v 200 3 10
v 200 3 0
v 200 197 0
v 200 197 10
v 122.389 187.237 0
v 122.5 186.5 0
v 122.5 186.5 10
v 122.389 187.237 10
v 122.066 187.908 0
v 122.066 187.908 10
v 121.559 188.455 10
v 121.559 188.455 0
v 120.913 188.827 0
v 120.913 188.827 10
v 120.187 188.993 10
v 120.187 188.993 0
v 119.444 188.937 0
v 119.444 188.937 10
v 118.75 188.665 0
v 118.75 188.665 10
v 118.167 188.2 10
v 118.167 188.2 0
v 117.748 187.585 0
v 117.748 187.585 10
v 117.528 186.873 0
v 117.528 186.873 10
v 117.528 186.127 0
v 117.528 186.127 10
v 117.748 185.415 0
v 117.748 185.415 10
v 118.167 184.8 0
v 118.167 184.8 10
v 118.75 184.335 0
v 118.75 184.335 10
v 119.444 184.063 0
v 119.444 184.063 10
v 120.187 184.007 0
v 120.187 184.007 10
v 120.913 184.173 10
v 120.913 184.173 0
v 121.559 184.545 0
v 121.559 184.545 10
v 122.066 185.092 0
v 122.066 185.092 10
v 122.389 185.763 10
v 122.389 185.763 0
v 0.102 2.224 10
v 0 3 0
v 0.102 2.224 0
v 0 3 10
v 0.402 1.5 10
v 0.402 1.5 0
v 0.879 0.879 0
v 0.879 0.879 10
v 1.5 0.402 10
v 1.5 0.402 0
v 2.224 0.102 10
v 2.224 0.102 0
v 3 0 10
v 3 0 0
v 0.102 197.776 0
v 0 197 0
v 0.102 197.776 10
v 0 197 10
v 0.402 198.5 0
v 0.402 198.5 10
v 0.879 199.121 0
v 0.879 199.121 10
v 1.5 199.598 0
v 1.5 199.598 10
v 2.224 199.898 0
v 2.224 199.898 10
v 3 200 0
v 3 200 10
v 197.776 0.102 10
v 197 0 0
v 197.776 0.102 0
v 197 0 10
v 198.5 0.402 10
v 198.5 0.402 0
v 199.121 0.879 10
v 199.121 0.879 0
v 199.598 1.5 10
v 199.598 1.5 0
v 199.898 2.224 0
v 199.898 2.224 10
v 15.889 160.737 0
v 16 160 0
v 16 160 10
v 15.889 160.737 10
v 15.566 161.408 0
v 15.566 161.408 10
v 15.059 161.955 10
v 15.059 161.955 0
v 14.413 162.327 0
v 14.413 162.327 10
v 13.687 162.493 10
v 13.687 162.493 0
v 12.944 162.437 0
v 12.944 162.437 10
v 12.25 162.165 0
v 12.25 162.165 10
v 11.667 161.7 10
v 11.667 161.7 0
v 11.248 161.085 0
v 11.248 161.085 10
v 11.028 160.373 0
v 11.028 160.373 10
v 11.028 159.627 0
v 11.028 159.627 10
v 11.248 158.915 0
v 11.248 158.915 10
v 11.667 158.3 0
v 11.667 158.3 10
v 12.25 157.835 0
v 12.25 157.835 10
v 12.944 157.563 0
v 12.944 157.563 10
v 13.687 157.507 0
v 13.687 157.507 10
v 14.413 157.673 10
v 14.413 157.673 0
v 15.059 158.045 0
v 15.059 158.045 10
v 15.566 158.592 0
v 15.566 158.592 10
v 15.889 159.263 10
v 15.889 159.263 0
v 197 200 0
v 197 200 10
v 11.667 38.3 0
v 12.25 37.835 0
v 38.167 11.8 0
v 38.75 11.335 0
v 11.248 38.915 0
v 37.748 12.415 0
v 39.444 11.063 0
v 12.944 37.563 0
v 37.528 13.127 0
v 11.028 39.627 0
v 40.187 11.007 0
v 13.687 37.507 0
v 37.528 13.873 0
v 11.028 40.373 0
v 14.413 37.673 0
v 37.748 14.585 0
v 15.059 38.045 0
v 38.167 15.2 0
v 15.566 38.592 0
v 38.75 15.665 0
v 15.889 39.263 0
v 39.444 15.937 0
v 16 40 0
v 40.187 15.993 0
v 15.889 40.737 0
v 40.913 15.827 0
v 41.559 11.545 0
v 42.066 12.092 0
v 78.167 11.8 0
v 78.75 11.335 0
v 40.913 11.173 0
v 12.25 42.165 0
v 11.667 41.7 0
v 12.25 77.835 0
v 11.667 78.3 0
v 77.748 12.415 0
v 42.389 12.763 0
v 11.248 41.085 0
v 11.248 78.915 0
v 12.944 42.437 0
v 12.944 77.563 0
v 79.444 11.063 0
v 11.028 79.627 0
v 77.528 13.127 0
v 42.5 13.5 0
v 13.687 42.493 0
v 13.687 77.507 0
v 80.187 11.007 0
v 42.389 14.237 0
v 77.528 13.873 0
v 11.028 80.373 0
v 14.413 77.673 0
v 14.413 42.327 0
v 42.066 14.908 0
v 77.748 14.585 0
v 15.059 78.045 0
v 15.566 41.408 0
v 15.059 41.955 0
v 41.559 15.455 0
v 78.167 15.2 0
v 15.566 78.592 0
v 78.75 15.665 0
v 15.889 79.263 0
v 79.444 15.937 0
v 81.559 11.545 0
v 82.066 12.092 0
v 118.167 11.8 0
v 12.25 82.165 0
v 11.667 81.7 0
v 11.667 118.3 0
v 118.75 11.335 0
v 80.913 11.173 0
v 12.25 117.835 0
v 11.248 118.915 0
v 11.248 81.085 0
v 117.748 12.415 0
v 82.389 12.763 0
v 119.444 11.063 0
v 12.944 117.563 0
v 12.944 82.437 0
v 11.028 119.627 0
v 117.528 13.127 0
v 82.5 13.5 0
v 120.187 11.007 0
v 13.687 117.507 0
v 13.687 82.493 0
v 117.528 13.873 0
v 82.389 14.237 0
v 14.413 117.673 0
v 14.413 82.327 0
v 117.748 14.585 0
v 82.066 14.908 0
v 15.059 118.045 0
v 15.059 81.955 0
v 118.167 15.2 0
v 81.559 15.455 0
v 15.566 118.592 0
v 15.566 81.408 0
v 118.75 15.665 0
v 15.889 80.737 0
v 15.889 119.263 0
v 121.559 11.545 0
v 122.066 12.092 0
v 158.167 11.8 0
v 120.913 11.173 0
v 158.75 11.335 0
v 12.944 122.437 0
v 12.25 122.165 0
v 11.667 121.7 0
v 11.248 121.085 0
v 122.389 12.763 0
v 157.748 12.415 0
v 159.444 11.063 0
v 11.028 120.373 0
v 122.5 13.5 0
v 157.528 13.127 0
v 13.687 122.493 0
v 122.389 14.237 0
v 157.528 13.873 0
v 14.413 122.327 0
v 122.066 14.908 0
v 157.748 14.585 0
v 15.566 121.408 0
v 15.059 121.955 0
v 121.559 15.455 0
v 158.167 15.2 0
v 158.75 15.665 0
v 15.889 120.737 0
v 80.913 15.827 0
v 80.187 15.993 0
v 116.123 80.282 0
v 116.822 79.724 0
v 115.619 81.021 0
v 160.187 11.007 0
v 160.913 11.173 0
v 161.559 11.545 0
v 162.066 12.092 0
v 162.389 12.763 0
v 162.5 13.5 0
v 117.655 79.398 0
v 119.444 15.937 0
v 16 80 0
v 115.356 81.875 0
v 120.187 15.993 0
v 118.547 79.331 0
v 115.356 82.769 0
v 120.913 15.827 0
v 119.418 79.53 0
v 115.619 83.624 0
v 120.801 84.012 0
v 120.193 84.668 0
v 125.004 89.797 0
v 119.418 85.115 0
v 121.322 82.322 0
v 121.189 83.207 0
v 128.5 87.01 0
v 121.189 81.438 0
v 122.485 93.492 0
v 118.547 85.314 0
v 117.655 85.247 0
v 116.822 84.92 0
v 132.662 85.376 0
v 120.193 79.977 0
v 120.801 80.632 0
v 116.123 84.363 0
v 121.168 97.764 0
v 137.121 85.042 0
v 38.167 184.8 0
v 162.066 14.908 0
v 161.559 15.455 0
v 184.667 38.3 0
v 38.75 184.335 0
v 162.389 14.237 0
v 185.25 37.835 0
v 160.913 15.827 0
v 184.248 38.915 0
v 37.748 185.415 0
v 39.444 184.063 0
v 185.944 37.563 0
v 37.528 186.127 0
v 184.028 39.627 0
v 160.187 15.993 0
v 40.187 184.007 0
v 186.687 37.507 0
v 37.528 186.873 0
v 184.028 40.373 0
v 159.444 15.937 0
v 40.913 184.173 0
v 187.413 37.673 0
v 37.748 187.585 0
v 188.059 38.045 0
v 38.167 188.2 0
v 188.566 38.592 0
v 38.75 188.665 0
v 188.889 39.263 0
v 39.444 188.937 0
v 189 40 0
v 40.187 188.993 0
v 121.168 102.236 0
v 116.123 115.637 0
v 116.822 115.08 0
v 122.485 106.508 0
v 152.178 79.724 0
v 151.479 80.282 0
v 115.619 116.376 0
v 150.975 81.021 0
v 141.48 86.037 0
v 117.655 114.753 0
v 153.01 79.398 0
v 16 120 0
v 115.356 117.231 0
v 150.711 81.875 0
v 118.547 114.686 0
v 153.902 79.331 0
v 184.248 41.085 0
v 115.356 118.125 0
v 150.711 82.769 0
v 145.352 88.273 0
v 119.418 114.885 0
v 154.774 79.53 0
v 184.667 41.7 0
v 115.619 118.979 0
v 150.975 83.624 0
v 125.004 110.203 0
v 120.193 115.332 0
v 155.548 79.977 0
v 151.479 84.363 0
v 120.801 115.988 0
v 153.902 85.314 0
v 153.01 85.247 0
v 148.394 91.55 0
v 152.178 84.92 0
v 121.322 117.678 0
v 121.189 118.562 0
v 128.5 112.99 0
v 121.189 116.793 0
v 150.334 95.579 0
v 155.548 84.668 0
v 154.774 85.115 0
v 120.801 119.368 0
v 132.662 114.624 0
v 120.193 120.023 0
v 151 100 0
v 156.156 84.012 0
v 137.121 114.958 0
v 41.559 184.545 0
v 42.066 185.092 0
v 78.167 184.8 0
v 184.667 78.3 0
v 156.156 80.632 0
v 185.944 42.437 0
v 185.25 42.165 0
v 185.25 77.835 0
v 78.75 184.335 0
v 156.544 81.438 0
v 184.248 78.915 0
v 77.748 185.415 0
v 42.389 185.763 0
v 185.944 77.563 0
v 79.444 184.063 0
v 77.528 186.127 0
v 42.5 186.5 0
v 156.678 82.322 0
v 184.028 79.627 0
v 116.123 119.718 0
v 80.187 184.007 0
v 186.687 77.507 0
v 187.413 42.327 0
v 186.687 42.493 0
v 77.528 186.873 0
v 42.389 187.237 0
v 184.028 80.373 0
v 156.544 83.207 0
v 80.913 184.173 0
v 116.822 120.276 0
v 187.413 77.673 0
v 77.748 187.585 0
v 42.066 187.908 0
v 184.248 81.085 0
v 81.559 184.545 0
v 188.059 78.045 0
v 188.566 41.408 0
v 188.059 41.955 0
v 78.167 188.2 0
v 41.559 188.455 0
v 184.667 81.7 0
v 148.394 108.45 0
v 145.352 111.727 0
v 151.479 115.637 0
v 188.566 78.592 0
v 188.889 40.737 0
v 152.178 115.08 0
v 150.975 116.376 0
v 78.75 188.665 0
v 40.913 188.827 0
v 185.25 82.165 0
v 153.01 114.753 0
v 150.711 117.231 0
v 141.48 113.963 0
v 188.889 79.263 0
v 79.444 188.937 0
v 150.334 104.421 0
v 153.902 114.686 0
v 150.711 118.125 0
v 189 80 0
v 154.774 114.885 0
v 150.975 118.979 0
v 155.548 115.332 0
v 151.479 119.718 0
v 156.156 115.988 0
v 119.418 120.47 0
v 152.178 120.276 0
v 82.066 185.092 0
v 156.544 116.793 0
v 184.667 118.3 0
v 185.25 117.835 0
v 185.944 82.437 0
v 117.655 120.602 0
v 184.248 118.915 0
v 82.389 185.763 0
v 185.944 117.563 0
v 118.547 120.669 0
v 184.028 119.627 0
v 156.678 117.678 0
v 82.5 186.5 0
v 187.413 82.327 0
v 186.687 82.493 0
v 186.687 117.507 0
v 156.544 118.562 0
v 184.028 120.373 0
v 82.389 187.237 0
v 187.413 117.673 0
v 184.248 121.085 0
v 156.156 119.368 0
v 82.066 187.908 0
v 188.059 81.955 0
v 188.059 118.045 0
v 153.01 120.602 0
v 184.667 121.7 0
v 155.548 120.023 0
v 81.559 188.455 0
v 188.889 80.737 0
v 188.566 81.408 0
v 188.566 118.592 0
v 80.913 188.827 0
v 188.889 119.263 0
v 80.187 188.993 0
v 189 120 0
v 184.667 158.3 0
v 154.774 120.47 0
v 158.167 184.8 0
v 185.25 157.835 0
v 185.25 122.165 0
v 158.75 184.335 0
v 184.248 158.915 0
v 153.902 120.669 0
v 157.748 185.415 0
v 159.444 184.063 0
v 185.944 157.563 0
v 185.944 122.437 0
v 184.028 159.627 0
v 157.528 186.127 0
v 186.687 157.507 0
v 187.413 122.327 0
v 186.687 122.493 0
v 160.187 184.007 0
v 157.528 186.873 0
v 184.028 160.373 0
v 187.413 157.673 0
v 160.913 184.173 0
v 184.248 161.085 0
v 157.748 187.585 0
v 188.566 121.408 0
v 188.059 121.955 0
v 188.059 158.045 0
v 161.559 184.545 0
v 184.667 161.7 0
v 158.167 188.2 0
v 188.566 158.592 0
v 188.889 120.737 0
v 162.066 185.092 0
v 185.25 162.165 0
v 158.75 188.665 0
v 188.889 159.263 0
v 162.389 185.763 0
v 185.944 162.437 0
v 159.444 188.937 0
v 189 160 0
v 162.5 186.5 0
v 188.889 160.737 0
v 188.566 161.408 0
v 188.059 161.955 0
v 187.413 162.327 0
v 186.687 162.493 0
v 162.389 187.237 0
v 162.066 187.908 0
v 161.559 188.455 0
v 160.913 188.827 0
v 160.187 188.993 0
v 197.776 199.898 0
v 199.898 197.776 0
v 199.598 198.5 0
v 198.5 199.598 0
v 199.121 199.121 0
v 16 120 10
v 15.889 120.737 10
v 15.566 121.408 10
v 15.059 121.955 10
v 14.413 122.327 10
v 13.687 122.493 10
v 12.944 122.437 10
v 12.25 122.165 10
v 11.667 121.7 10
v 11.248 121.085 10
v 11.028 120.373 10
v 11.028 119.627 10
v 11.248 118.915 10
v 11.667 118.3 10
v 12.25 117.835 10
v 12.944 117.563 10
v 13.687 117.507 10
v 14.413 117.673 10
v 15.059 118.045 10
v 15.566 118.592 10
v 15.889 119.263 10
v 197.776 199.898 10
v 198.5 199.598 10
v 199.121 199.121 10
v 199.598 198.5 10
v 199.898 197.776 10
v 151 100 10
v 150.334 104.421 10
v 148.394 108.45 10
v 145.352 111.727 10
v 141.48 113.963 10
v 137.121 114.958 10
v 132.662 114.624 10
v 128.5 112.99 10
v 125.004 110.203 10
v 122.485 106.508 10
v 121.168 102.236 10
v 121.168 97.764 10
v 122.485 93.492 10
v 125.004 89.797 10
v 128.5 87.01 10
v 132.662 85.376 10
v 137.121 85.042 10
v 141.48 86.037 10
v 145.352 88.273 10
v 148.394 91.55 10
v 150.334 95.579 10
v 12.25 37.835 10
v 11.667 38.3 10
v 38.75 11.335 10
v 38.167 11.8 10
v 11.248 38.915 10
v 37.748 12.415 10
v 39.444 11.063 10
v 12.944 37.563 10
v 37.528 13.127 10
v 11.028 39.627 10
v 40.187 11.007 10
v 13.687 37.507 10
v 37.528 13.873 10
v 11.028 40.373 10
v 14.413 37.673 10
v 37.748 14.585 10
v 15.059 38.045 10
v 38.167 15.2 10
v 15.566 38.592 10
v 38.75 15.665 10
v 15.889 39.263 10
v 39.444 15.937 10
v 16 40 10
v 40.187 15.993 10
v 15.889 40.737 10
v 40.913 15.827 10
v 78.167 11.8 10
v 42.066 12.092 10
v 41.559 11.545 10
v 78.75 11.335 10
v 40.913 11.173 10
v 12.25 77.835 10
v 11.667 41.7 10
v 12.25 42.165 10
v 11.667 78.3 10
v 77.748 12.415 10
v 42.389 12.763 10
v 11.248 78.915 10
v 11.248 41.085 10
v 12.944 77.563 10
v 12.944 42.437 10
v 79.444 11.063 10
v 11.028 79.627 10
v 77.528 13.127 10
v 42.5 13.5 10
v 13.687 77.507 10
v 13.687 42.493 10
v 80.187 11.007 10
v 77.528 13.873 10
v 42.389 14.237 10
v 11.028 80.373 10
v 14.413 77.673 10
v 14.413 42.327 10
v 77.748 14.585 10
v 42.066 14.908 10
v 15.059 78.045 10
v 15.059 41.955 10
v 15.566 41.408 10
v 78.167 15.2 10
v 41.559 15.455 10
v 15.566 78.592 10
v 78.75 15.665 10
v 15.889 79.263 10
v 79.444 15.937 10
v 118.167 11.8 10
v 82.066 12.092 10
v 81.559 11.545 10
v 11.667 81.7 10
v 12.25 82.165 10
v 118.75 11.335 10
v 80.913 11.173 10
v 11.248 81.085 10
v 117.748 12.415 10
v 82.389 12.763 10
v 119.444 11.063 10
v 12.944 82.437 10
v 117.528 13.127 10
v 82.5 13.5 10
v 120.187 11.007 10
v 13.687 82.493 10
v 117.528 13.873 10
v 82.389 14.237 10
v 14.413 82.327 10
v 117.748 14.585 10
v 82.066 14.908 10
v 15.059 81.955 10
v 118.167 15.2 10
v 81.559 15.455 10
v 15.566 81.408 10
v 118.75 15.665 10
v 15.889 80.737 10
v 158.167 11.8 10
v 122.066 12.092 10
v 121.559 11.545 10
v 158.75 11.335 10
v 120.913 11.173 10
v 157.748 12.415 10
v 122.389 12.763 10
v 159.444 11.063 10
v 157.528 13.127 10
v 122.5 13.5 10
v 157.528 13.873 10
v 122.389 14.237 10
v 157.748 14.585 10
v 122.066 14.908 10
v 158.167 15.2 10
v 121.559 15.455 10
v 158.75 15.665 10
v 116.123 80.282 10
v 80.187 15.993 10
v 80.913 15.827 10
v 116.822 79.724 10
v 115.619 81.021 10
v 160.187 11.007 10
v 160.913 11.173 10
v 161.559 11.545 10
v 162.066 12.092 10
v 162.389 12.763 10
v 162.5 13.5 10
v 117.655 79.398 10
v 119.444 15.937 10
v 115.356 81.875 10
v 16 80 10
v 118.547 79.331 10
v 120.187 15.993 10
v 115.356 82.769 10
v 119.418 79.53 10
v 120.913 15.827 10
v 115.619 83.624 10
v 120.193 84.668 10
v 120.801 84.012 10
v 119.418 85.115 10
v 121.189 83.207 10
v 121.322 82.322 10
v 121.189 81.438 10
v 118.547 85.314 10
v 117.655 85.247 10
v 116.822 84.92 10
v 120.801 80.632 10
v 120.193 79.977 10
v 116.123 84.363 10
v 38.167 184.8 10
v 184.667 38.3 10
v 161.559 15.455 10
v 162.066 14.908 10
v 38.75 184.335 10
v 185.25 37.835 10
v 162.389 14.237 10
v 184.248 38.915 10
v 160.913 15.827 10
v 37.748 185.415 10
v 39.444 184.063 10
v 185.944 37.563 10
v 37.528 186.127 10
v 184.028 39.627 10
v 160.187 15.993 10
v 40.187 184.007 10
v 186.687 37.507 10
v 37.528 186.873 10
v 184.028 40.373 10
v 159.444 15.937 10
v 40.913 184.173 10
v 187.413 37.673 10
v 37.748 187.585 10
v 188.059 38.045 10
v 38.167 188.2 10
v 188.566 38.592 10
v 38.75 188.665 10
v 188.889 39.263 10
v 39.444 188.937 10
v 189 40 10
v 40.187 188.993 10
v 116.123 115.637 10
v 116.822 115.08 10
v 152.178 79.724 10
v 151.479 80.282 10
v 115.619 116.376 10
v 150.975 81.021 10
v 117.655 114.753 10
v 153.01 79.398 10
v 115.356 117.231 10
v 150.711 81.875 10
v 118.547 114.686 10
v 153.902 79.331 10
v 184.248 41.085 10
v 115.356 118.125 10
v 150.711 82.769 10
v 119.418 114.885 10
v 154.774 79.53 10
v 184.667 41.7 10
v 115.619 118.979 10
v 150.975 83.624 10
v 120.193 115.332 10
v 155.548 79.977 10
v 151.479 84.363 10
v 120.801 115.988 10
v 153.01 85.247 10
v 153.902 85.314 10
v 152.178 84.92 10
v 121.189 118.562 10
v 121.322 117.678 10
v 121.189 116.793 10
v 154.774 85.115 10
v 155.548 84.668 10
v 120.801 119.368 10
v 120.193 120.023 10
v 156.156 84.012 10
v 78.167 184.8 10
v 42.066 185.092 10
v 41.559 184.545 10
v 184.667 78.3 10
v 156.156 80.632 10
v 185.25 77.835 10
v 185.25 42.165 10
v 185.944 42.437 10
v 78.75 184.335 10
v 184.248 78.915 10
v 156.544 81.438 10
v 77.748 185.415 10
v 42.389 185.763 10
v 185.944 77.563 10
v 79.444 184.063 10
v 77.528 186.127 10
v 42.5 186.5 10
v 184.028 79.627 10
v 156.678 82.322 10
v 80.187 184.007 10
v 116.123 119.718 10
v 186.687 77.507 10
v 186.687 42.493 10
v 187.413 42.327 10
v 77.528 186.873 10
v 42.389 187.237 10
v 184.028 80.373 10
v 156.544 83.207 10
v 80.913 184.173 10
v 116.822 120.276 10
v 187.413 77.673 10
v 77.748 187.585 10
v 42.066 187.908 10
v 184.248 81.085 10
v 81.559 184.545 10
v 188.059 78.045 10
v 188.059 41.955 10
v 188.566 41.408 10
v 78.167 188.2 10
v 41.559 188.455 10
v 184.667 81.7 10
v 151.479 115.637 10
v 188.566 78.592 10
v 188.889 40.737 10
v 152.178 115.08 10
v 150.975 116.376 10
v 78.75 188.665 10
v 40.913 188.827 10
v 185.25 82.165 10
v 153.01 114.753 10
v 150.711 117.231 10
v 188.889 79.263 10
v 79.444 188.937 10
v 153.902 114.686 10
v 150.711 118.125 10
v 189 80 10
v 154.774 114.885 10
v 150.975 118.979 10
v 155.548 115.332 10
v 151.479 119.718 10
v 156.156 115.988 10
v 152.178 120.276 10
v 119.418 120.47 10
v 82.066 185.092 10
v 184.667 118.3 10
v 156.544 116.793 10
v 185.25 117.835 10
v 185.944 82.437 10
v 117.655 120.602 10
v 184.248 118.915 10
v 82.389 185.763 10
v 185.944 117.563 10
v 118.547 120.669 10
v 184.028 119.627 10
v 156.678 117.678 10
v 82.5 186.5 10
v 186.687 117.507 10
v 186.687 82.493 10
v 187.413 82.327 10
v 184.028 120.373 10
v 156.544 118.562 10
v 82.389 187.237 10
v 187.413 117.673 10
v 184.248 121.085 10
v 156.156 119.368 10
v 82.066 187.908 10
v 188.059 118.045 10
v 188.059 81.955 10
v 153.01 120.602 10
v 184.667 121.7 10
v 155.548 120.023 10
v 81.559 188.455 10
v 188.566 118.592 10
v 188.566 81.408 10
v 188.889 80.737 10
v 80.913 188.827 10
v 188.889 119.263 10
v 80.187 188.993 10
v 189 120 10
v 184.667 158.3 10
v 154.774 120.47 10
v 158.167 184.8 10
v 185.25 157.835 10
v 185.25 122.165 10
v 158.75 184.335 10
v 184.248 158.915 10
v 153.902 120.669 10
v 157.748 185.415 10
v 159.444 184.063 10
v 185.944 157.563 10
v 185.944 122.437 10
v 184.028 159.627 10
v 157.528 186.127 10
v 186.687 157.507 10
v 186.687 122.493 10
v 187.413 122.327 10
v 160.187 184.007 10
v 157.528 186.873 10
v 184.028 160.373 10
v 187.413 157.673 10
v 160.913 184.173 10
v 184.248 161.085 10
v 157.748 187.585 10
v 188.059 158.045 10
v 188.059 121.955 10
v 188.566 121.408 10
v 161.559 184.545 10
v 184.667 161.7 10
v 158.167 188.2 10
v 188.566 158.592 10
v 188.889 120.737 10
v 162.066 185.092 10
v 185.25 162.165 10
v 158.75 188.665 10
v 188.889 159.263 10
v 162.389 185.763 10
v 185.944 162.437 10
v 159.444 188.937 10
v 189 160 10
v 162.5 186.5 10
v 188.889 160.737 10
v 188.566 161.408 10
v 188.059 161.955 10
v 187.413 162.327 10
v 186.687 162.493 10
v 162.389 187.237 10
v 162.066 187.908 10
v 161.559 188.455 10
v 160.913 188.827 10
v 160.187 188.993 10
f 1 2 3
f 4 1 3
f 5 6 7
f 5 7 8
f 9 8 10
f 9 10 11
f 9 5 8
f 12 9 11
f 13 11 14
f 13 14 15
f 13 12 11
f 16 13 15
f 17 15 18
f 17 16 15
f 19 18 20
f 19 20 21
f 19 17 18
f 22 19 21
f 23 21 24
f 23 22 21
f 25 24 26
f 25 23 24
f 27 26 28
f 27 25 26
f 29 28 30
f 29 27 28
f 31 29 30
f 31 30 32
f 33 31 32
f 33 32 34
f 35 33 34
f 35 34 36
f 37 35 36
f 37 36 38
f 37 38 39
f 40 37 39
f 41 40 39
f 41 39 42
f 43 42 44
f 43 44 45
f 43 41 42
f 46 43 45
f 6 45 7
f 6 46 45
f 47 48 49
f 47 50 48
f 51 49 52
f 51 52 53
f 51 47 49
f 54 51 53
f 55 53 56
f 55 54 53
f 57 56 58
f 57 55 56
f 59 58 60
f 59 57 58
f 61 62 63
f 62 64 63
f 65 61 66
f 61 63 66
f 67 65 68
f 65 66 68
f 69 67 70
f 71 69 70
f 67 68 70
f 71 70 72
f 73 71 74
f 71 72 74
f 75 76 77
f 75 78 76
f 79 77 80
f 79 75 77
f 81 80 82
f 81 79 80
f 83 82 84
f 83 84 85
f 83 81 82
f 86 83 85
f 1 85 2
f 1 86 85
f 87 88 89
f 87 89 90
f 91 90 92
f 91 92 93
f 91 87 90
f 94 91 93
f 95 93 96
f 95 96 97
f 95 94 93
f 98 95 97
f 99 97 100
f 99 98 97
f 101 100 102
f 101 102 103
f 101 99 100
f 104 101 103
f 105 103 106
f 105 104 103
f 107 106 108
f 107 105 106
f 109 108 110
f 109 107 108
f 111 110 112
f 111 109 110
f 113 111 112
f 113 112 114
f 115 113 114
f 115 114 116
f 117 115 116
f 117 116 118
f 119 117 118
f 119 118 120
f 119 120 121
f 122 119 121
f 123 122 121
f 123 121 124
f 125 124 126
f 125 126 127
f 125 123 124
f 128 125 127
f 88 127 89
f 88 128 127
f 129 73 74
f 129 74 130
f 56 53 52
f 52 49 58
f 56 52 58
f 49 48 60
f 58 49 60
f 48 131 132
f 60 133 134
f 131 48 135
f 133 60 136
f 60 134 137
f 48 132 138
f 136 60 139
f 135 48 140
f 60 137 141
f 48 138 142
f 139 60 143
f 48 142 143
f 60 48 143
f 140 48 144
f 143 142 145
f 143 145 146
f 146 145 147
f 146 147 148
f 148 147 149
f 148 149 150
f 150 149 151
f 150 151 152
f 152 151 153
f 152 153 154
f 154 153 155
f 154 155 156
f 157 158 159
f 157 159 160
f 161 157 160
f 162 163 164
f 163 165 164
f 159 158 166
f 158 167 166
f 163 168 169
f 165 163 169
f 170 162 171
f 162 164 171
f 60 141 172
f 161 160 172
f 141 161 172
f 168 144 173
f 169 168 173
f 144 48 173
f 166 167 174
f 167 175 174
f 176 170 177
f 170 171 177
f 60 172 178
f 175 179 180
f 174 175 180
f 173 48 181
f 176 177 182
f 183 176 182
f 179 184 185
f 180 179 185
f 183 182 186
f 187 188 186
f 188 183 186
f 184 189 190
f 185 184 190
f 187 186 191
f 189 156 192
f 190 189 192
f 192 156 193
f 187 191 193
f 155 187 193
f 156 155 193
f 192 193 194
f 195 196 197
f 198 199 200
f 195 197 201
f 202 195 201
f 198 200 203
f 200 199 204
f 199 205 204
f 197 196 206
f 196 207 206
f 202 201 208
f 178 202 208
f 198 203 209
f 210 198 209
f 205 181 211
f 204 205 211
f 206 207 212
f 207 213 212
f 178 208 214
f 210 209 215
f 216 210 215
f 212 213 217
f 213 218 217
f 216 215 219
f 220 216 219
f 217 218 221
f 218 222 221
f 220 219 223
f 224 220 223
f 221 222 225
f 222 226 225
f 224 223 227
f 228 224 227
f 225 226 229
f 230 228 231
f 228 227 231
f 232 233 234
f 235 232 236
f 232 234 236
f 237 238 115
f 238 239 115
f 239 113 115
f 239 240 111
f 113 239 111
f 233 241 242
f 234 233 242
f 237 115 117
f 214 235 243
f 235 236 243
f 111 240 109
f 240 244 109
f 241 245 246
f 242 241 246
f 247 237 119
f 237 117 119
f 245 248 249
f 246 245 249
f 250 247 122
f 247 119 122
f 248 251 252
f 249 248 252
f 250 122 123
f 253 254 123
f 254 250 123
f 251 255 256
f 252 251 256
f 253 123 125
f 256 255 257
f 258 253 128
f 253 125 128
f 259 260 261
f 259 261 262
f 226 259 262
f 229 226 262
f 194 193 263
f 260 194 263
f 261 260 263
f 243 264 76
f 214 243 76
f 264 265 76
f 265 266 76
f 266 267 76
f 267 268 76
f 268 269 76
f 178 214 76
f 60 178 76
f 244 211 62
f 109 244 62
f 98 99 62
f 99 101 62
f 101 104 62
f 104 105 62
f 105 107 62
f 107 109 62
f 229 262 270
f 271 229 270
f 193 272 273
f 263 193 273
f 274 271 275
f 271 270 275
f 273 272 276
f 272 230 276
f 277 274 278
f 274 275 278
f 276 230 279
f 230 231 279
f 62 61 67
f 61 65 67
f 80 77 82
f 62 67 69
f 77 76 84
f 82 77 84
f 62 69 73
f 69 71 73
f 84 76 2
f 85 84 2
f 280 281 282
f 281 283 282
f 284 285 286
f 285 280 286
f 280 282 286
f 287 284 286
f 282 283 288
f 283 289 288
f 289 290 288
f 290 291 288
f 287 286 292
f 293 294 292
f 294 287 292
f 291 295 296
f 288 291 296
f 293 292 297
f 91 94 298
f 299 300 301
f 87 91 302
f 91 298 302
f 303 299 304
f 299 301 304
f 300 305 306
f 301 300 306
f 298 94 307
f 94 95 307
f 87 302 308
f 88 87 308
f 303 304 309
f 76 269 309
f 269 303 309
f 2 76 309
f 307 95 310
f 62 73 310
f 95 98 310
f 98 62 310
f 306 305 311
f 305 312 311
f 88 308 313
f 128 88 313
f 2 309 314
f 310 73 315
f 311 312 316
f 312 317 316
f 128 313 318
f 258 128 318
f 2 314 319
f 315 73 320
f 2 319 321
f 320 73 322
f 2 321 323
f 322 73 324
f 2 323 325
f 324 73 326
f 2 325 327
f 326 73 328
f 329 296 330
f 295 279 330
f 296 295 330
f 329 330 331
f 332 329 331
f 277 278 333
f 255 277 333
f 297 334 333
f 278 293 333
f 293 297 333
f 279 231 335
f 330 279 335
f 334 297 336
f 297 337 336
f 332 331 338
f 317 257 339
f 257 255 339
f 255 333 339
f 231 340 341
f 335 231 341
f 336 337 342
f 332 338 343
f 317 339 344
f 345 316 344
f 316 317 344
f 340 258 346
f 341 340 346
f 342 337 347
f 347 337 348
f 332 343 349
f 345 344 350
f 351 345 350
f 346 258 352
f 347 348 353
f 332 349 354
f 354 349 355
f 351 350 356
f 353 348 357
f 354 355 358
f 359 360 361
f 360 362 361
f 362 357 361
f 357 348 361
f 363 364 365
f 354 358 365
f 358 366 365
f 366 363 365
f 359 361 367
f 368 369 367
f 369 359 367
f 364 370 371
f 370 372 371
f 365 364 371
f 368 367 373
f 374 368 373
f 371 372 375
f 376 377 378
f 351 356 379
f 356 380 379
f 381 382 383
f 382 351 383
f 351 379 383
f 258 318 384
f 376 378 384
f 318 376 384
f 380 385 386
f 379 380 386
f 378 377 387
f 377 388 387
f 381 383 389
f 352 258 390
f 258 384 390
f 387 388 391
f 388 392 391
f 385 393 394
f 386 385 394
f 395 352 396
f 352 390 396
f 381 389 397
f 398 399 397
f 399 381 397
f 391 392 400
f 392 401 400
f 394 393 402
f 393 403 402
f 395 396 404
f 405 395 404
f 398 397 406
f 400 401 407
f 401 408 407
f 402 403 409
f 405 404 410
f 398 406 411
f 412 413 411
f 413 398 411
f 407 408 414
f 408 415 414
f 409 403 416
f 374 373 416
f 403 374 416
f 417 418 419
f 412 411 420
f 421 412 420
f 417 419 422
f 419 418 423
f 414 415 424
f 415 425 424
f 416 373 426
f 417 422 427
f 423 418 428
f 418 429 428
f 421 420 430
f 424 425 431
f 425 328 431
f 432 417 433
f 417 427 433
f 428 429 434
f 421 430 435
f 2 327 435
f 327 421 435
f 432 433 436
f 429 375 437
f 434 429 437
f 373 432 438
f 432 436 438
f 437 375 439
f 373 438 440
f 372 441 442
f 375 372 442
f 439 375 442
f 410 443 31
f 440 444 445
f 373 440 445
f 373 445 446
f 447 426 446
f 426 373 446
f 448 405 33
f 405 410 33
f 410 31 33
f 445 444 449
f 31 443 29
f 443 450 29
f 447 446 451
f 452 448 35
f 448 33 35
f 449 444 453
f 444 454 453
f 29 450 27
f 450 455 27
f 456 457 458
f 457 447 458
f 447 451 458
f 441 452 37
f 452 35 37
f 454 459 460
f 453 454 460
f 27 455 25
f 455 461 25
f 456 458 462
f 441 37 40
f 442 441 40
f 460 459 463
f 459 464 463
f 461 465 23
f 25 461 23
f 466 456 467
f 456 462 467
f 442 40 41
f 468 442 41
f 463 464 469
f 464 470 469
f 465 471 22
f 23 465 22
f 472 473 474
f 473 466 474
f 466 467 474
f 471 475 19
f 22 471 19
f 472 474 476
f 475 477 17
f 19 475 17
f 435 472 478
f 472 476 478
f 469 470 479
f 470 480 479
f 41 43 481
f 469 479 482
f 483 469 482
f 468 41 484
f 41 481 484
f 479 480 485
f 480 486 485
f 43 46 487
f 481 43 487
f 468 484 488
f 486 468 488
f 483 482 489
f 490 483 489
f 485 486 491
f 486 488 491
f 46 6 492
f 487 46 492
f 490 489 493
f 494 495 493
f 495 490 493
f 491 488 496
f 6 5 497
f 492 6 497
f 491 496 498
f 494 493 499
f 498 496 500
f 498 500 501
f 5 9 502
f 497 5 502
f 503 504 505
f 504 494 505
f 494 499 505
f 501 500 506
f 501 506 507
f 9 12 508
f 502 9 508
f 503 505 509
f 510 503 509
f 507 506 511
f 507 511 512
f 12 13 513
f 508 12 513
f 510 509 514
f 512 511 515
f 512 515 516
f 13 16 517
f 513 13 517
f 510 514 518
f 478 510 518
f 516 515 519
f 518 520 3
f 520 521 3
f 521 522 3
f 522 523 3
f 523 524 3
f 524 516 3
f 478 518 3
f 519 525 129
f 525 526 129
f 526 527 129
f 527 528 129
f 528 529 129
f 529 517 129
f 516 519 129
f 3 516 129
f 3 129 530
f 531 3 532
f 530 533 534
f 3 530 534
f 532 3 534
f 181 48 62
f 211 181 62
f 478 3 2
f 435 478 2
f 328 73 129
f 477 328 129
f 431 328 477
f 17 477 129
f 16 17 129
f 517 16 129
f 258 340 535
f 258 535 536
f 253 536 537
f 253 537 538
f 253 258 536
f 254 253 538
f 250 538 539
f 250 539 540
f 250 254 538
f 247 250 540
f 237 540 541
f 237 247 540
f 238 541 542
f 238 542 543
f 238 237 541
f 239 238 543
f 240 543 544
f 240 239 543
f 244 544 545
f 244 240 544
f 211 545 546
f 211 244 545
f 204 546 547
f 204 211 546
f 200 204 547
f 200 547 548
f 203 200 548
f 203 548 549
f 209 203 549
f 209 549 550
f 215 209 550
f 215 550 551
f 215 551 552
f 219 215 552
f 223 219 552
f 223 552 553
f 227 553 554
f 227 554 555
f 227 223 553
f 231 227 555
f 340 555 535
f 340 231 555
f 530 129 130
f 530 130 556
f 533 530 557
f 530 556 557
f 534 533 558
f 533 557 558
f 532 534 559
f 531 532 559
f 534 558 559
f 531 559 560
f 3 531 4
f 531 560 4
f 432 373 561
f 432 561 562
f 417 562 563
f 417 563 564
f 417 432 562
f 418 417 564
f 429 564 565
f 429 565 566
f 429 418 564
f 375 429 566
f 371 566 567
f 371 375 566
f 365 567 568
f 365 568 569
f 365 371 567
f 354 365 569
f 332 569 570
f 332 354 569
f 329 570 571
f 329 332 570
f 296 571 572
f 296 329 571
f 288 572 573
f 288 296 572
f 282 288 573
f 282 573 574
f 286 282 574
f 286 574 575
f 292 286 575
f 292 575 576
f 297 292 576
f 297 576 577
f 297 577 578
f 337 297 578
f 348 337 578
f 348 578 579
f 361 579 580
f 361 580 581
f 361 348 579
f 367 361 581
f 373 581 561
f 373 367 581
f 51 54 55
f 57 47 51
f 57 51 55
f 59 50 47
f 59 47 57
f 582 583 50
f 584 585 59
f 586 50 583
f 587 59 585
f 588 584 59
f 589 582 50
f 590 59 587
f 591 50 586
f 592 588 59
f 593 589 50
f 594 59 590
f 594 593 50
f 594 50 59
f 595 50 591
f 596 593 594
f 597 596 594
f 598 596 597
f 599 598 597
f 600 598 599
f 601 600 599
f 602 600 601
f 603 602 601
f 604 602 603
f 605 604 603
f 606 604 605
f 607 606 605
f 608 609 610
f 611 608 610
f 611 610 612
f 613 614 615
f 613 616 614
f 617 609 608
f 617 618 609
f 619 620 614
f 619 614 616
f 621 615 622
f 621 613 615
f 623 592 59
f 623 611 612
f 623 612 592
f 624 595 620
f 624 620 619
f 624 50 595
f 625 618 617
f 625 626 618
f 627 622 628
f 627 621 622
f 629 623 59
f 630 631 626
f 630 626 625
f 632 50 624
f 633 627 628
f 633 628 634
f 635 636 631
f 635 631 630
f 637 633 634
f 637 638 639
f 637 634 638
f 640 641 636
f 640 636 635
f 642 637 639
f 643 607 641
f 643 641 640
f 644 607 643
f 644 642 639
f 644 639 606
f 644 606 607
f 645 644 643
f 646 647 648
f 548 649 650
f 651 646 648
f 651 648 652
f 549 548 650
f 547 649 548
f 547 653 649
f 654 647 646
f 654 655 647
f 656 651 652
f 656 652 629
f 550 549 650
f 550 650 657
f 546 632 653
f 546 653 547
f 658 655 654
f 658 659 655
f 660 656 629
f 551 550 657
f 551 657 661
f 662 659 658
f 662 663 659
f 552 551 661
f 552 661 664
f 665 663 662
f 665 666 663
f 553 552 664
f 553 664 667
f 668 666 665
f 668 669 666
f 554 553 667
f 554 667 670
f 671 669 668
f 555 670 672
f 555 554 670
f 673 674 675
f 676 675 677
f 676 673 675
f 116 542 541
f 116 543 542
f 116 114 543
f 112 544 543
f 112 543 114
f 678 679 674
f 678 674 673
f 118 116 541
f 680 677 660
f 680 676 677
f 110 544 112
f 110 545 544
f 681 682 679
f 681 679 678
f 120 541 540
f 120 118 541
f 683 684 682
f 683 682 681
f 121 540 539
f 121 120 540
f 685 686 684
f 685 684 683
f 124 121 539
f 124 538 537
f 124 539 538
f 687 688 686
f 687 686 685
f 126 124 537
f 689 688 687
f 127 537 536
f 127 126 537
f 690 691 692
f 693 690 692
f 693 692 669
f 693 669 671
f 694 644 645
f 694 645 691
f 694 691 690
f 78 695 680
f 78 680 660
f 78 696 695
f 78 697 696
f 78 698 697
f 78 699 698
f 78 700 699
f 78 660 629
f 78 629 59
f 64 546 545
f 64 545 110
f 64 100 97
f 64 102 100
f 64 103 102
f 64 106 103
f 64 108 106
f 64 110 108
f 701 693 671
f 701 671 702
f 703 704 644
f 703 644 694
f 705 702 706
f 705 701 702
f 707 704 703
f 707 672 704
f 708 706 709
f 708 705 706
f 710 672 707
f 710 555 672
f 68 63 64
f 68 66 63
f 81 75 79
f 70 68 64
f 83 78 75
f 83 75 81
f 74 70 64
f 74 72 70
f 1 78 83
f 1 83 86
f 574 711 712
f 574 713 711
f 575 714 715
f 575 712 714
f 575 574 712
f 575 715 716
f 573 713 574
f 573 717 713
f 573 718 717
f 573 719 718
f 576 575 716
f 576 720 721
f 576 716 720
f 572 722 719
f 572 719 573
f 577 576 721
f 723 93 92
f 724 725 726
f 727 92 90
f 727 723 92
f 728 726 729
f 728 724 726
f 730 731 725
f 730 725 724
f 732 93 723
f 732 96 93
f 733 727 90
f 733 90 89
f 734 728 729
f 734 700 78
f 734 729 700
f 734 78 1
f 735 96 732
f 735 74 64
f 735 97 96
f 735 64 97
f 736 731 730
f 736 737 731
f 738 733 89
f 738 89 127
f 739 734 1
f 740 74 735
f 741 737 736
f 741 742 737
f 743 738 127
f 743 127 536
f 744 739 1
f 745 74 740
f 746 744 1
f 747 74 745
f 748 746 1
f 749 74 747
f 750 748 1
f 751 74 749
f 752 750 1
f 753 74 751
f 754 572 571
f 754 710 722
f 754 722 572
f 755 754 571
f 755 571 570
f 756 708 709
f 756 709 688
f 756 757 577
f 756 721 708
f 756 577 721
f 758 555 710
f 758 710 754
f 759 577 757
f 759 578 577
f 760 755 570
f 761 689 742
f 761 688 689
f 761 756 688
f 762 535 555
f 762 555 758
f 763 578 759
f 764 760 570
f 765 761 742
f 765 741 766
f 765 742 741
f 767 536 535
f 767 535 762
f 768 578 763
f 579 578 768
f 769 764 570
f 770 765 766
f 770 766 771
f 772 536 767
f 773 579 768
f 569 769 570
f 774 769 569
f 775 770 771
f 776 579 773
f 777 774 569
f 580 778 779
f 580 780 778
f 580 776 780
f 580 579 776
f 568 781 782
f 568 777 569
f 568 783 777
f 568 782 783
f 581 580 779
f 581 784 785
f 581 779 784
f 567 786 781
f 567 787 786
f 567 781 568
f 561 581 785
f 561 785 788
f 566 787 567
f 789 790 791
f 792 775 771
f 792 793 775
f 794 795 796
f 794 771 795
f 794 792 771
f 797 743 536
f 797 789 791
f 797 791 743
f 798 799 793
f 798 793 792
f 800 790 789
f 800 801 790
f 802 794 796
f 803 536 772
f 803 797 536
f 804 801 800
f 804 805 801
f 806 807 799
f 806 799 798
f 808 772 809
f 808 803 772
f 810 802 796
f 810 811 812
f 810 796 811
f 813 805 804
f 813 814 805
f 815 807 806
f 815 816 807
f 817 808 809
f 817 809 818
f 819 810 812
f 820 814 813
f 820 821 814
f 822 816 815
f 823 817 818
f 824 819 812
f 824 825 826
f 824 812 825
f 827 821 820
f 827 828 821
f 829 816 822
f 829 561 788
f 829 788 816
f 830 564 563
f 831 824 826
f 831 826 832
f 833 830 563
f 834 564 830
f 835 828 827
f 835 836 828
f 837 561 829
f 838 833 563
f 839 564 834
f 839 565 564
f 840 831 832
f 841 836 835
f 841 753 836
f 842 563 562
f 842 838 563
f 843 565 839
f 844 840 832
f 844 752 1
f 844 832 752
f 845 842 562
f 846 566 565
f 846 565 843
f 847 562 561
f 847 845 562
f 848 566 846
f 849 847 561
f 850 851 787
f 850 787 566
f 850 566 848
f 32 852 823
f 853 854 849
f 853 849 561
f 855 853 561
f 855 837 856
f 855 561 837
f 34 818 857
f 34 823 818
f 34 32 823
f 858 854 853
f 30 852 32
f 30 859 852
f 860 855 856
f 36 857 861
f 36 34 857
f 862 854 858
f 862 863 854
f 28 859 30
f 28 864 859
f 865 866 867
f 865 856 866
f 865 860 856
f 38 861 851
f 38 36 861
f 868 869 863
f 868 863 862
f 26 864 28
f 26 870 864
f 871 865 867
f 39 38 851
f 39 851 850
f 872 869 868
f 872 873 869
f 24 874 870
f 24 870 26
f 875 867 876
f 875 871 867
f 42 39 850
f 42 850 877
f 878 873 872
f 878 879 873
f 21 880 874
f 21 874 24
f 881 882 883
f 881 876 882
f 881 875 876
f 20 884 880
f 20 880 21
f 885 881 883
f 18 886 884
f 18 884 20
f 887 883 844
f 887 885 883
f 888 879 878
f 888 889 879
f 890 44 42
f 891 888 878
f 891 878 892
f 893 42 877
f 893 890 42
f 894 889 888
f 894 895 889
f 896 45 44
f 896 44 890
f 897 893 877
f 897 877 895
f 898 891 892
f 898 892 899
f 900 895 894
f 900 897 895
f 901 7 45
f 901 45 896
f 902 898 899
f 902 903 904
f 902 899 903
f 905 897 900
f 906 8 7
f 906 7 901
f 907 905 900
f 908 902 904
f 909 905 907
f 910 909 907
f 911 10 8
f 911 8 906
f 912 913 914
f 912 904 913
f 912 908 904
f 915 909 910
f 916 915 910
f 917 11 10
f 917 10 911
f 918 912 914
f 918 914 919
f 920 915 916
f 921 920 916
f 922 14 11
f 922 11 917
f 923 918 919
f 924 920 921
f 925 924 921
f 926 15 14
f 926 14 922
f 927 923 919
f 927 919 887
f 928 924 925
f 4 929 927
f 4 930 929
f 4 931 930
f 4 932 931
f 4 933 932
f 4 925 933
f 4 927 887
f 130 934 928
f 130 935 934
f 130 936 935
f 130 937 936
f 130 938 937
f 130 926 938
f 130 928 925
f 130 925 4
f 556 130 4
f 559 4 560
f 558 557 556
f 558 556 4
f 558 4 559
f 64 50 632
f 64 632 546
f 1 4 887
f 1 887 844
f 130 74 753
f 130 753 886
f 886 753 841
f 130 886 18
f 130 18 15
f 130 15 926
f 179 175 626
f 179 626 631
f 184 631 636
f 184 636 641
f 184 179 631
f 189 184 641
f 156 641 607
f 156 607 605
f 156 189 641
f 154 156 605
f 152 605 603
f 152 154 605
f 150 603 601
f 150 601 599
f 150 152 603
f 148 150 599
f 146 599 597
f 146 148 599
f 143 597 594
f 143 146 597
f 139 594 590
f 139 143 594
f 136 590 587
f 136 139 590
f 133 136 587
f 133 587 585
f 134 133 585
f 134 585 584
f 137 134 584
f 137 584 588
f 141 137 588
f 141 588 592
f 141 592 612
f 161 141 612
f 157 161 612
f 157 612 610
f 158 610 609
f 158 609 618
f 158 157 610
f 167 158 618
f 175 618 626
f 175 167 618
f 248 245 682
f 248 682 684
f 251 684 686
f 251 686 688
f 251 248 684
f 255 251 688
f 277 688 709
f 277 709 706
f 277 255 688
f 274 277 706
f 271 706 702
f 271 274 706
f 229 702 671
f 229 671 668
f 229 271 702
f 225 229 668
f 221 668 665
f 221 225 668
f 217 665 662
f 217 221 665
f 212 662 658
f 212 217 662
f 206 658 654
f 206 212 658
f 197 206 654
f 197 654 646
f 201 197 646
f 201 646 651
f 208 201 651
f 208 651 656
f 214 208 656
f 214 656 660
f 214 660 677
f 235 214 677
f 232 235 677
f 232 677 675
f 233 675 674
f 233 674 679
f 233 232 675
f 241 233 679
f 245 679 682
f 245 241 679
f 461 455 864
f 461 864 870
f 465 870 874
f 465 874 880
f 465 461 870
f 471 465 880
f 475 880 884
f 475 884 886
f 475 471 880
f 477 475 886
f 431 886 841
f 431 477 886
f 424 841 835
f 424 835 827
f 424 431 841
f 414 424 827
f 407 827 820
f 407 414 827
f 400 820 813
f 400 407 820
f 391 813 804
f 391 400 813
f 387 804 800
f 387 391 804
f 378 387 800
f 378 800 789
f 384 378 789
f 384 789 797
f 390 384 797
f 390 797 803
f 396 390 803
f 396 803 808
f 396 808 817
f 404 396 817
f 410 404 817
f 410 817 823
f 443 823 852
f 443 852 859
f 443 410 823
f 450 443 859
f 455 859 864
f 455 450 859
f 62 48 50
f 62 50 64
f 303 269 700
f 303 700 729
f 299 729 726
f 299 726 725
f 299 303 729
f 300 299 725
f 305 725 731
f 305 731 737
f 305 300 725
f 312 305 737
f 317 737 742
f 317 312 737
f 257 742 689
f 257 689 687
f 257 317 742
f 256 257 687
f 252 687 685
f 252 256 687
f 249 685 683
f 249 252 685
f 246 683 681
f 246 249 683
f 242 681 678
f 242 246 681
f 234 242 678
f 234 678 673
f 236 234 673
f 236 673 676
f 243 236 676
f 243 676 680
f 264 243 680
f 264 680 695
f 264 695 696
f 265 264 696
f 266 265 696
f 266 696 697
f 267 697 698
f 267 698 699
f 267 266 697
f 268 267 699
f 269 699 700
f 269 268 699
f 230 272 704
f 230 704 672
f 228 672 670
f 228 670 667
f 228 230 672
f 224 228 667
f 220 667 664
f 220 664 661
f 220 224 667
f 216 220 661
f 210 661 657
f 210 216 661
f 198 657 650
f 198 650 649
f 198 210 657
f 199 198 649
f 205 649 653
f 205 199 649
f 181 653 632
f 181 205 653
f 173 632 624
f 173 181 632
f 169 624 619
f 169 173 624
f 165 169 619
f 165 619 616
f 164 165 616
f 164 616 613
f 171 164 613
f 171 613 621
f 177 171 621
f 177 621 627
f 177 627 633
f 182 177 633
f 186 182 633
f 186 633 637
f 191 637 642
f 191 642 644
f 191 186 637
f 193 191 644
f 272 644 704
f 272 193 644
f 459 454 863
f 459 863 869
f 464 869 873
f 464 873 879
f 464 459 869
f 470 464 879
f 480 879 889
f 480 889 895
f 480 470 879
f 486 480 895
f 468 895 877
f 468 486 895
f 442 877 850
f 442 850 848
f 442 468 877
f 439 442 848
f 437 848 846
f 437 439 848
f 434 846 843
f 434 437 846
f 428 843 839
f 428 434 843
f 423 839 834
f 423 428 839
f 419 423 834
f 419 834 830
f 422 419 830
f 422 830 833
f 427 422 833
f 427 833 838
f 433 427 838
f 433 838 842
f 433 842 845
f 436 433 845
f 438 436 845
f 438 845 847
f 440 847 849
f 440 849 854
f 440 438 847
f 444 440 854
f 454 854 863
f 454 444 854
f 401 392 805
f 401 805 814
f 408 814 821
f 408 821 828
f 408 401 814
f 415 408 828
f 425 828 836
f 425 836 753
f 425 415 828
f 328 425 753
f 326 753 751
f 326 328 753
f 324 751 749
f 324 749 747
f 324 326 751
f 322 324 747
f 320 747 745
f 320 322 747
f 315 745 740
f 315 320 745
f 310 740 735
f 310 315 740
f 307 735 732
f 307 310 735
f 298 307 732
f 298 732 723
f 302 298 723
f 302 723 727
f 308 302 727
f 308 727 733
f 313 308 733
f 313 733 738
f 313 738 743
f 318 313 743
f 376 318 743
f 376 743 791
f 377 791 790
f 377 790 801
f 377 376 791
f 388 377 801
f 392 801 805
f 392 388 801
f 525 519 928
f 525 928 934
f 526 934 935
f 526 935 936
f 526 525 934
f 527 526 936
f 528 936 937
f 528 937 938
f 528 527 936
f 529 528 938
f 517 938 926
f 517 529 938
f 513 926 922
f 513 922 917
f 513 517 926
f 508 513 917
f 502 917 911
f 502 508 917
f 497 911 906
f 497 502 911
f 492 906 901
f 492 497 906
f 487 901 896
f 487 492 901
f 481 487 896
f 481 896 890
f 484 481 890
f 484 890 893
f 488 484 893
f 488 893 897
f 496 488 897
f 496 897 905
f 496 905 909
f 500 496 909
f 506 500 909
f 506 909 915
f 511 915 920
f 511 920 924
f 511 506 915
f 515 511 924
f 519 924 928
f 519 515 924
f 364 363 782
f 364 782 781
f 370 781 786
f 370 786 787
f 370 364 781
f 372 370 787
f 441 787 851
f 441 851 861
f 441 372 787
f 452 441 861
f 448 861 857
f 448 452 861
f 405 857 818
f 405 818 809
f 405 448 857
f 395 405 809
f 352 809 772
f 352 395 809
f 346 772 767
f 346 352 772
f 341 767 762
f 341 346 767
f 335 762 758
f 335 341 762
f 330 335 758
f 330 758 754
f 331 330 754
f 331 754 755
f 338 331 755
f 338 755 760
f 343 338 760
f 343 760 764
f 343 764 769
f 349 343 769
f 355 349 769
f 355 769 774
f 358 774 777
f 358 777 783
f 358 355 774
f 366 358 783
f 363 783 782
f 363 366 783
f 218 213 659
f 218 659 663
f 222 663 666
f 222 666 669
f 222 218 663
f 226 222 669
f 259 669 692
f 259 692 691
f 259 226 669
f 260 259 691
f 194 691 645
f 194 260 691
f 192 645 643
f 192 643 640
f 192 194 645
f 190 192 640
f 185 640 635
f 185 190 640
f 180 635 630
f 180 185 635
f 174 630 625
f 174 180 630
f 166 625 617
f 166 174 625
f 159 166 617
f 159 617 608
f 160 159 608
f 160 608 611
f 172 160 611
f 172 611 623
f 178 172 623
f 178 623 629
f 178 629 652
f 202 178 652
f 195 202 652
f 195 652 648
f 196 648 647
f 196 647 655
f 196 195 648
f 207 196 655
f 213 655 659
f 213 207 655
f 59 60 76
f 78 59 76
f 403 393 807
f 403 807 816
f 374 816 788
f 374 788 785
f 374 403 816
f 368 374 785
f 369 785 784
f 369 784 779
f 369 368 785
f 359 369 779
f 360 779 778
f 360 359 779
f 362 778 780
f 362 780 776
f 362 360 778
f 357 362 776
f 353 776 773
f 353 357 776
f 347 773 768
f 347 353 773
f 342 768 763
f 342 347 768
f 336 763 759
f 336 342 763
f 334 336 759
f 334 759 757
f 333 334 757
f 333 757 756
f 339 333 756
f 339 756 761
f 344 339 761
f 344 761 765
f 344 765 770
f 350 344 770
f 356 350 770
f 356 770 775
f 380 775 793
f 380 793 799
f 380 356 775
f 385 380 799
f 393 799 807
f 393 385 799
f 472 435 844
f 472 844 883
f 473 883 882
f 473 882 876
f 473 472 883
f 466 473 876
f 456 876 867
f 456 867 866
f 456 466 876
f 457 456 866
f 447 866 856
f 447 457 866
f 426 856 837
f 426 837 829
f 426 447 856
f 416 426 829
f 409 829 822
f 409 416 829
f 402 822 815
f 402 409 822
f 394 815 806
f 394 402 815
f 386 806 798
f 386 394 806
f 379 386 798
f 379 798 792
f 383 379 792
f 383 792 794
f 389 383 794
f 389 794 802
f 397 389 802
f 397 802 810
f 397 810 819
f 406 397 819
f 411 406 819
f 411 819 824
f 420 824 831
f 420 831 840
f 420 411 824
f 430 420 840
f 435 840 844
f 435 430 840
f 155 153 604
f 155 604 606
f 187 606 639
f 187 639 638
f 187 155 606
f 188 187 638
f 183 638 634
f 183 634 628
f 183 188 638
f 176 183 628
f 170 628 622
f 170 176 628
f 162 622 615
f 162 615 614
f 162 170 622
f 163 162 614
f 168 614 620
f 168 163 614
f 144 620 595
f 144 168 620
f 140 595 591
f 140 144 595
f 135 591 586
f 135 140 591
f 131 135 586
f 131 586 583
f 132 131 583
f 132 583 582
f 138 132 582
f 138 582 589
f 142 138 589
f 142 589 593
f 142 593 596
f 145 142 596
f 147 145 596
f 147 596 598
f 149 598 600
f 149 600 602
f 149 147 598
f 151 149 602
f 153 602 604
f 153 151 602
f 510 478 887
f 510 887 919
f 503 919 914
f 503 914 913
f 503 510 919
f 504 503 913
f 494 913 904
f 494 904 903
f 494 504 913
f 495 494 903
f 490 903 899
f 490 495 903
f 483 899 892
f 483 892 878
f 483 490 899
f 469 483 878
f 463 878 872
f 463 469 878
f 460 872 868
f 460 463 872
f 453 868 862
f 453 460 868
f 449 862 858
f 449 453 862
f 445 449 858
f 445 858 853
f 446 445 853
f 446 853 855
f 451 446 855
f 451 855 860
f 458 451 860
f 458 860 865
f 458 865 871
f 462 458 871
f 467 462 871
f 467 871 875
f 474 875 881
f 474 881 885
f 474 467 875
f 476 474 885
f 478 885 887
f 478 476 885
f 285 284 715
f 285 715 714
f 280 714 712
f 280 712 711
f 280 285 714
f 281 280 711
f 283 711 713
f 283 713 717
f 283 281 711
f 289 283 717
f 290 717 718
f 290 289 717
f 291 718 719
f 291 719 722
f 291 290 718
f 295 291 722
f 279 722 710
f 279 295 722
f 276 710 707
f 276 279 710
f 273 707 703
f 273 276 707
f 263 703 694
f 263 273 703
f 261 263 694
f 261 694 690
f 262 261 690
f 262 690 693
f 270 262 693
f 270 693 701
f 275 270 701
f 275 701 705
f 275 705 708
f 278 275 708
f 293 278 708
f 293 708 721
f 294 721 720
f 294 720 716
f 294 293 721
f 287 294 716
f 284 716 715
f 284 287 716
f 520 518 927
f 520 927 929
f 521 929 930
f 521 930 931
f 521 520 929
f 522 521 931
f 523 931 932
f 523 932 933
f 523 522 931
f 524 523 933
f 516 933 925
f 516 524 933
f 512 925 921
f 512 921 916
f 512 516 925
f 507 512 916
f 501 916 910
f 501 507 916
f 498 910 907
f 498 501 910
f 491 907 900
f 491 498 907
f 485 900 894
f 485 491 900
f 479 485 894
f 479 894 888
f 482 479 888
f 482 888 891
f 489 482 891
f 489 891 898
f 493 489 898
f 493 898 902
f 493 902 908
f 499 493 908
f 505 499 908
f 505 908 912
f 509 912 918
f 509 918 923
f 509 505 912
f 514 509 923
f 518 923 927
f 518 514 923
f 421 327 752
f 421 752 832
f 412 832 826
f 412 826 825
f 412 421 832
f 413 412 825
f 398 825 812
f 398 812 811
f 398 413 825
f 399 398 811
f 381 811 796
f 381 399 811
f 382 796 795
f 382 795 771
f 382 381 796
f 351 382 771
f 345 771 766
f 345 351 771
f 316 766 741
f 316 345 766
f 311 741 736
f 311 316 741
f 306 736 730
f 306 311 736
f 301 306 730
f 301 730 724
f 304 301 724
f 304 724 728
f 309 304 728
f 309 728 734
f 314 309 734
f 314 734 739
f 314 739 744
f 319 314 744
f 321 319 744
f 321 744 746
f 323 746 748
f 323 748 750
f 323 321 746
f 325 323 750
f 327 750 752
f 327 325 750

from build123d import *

# Parameters (mm, degrees)
SKETCH_W   = 200
SKETCH_H   = 200
SKETCH_R   = 15
SKETCH_R_2 = 3
SKETCH_R_3 = 2.5
PAD_DEPTH  = 10
FILLET_R   = 3


with BuildPart() as part:
    # Sketch → Pad (new body)
    with BuildSketch(Plane.XY):
        with Locations((100, 100)):
            Rectangle(SKETCH_W, SKETCH_H)
        with Locations((136, 100)):
            Circle(SKETCH_R, mode=Mode.SUBTRACT)
        with Locations((118.32233, 117.67767)):
            Circle(SKETCH_R_2, mode=Mode.SUBTRACT)
        with Locations((153.67767, 117.67767)):
            Circle(SKETCH_R_2, mode=Mode.SUBTRACT)
        with Locations((118.32233, 82.32233)):
            Circle(SKETCH_R_2, mode=Mode.SUBTRACT)
        with Locations((153.67767, 82.32233)):
            Circle(SKETCH_R_2, mode=Mode.SUBTRACT)
        with Locations((40, 13.5)):
            Circle(SKETCH_R_3, mode=Mode.SUBTRACT)
        with Locations((160, 13.5)):
            Circle(SKETCH_R_3, mode=Mode.SUBTRACT)
        with Locations((80, 13.5)):
            Circle(SKETCH_R_3, mode=Mode.SUBTRACT)
        with Locations((120, 13.5)):
            Circle(SKETCH_R_3, mode=Mode.SUBTRACT)
        with Locations((40, 186.5)):
            Circle(SKETCH_R_3, mode=Mode.SUBTRACT)
        with Locations((80, 186.5)):
            Circle(SKETCH_R_3, mode=Mode.SUBTRACT)
        with Locations((120, 186.5)):
            Circle(SKETCH_R_3, mode=Mode.SUBTRACT)
        with Locations((160, 186.5)):
            Circle(SKETCH_R_3, mode=Mode.SUBTRACT)
        with Locations((13.5, 160)):
            Circle(SKETCH_R_3, mode=Mode.SUBTRACT)
        with Locations((13.5, 120)):
            Circle(SKETCH_R_3, mode=Mode.SUBTRACT)
        with Locations((13.5, 80)):
            Circle(SKETCH_R_3, mode=Mode.SUBTRACT)
        with Locations((13.5, 40)):
            Circle(SKETCH_R_3, mode=Mode.SUBTRACT)
        with Locations((186.5, 160)):
            Circle(SKETCH_R_3, mode=Mode.SUBTRACT)
        with Locations((186.5, 120)):
            Circle(SKETCH_R_3, mode=Mode.SUBTRACT)
        with Locations((186.5, 80)):
            Circle(SKETCH_R_3, mode=Mode.SUBTRACT)
        with Locations((186.5, 40)):
            Circle(SKETCH_R_3, mode=Mode.SUBTRACT)
    extrude(amount=PAD_DEPTH)

    # Fillet
    fillet_edges = [part.edges().sort_by_distance(p)[0] for p in [
        (0, 0, 5),
        (200, 0, 5),
        (0, 200, 5),
        (200, 200, 5),
    ]]
    fillet(fillet_edges, radius=FILLET_R)


solid = part.part
